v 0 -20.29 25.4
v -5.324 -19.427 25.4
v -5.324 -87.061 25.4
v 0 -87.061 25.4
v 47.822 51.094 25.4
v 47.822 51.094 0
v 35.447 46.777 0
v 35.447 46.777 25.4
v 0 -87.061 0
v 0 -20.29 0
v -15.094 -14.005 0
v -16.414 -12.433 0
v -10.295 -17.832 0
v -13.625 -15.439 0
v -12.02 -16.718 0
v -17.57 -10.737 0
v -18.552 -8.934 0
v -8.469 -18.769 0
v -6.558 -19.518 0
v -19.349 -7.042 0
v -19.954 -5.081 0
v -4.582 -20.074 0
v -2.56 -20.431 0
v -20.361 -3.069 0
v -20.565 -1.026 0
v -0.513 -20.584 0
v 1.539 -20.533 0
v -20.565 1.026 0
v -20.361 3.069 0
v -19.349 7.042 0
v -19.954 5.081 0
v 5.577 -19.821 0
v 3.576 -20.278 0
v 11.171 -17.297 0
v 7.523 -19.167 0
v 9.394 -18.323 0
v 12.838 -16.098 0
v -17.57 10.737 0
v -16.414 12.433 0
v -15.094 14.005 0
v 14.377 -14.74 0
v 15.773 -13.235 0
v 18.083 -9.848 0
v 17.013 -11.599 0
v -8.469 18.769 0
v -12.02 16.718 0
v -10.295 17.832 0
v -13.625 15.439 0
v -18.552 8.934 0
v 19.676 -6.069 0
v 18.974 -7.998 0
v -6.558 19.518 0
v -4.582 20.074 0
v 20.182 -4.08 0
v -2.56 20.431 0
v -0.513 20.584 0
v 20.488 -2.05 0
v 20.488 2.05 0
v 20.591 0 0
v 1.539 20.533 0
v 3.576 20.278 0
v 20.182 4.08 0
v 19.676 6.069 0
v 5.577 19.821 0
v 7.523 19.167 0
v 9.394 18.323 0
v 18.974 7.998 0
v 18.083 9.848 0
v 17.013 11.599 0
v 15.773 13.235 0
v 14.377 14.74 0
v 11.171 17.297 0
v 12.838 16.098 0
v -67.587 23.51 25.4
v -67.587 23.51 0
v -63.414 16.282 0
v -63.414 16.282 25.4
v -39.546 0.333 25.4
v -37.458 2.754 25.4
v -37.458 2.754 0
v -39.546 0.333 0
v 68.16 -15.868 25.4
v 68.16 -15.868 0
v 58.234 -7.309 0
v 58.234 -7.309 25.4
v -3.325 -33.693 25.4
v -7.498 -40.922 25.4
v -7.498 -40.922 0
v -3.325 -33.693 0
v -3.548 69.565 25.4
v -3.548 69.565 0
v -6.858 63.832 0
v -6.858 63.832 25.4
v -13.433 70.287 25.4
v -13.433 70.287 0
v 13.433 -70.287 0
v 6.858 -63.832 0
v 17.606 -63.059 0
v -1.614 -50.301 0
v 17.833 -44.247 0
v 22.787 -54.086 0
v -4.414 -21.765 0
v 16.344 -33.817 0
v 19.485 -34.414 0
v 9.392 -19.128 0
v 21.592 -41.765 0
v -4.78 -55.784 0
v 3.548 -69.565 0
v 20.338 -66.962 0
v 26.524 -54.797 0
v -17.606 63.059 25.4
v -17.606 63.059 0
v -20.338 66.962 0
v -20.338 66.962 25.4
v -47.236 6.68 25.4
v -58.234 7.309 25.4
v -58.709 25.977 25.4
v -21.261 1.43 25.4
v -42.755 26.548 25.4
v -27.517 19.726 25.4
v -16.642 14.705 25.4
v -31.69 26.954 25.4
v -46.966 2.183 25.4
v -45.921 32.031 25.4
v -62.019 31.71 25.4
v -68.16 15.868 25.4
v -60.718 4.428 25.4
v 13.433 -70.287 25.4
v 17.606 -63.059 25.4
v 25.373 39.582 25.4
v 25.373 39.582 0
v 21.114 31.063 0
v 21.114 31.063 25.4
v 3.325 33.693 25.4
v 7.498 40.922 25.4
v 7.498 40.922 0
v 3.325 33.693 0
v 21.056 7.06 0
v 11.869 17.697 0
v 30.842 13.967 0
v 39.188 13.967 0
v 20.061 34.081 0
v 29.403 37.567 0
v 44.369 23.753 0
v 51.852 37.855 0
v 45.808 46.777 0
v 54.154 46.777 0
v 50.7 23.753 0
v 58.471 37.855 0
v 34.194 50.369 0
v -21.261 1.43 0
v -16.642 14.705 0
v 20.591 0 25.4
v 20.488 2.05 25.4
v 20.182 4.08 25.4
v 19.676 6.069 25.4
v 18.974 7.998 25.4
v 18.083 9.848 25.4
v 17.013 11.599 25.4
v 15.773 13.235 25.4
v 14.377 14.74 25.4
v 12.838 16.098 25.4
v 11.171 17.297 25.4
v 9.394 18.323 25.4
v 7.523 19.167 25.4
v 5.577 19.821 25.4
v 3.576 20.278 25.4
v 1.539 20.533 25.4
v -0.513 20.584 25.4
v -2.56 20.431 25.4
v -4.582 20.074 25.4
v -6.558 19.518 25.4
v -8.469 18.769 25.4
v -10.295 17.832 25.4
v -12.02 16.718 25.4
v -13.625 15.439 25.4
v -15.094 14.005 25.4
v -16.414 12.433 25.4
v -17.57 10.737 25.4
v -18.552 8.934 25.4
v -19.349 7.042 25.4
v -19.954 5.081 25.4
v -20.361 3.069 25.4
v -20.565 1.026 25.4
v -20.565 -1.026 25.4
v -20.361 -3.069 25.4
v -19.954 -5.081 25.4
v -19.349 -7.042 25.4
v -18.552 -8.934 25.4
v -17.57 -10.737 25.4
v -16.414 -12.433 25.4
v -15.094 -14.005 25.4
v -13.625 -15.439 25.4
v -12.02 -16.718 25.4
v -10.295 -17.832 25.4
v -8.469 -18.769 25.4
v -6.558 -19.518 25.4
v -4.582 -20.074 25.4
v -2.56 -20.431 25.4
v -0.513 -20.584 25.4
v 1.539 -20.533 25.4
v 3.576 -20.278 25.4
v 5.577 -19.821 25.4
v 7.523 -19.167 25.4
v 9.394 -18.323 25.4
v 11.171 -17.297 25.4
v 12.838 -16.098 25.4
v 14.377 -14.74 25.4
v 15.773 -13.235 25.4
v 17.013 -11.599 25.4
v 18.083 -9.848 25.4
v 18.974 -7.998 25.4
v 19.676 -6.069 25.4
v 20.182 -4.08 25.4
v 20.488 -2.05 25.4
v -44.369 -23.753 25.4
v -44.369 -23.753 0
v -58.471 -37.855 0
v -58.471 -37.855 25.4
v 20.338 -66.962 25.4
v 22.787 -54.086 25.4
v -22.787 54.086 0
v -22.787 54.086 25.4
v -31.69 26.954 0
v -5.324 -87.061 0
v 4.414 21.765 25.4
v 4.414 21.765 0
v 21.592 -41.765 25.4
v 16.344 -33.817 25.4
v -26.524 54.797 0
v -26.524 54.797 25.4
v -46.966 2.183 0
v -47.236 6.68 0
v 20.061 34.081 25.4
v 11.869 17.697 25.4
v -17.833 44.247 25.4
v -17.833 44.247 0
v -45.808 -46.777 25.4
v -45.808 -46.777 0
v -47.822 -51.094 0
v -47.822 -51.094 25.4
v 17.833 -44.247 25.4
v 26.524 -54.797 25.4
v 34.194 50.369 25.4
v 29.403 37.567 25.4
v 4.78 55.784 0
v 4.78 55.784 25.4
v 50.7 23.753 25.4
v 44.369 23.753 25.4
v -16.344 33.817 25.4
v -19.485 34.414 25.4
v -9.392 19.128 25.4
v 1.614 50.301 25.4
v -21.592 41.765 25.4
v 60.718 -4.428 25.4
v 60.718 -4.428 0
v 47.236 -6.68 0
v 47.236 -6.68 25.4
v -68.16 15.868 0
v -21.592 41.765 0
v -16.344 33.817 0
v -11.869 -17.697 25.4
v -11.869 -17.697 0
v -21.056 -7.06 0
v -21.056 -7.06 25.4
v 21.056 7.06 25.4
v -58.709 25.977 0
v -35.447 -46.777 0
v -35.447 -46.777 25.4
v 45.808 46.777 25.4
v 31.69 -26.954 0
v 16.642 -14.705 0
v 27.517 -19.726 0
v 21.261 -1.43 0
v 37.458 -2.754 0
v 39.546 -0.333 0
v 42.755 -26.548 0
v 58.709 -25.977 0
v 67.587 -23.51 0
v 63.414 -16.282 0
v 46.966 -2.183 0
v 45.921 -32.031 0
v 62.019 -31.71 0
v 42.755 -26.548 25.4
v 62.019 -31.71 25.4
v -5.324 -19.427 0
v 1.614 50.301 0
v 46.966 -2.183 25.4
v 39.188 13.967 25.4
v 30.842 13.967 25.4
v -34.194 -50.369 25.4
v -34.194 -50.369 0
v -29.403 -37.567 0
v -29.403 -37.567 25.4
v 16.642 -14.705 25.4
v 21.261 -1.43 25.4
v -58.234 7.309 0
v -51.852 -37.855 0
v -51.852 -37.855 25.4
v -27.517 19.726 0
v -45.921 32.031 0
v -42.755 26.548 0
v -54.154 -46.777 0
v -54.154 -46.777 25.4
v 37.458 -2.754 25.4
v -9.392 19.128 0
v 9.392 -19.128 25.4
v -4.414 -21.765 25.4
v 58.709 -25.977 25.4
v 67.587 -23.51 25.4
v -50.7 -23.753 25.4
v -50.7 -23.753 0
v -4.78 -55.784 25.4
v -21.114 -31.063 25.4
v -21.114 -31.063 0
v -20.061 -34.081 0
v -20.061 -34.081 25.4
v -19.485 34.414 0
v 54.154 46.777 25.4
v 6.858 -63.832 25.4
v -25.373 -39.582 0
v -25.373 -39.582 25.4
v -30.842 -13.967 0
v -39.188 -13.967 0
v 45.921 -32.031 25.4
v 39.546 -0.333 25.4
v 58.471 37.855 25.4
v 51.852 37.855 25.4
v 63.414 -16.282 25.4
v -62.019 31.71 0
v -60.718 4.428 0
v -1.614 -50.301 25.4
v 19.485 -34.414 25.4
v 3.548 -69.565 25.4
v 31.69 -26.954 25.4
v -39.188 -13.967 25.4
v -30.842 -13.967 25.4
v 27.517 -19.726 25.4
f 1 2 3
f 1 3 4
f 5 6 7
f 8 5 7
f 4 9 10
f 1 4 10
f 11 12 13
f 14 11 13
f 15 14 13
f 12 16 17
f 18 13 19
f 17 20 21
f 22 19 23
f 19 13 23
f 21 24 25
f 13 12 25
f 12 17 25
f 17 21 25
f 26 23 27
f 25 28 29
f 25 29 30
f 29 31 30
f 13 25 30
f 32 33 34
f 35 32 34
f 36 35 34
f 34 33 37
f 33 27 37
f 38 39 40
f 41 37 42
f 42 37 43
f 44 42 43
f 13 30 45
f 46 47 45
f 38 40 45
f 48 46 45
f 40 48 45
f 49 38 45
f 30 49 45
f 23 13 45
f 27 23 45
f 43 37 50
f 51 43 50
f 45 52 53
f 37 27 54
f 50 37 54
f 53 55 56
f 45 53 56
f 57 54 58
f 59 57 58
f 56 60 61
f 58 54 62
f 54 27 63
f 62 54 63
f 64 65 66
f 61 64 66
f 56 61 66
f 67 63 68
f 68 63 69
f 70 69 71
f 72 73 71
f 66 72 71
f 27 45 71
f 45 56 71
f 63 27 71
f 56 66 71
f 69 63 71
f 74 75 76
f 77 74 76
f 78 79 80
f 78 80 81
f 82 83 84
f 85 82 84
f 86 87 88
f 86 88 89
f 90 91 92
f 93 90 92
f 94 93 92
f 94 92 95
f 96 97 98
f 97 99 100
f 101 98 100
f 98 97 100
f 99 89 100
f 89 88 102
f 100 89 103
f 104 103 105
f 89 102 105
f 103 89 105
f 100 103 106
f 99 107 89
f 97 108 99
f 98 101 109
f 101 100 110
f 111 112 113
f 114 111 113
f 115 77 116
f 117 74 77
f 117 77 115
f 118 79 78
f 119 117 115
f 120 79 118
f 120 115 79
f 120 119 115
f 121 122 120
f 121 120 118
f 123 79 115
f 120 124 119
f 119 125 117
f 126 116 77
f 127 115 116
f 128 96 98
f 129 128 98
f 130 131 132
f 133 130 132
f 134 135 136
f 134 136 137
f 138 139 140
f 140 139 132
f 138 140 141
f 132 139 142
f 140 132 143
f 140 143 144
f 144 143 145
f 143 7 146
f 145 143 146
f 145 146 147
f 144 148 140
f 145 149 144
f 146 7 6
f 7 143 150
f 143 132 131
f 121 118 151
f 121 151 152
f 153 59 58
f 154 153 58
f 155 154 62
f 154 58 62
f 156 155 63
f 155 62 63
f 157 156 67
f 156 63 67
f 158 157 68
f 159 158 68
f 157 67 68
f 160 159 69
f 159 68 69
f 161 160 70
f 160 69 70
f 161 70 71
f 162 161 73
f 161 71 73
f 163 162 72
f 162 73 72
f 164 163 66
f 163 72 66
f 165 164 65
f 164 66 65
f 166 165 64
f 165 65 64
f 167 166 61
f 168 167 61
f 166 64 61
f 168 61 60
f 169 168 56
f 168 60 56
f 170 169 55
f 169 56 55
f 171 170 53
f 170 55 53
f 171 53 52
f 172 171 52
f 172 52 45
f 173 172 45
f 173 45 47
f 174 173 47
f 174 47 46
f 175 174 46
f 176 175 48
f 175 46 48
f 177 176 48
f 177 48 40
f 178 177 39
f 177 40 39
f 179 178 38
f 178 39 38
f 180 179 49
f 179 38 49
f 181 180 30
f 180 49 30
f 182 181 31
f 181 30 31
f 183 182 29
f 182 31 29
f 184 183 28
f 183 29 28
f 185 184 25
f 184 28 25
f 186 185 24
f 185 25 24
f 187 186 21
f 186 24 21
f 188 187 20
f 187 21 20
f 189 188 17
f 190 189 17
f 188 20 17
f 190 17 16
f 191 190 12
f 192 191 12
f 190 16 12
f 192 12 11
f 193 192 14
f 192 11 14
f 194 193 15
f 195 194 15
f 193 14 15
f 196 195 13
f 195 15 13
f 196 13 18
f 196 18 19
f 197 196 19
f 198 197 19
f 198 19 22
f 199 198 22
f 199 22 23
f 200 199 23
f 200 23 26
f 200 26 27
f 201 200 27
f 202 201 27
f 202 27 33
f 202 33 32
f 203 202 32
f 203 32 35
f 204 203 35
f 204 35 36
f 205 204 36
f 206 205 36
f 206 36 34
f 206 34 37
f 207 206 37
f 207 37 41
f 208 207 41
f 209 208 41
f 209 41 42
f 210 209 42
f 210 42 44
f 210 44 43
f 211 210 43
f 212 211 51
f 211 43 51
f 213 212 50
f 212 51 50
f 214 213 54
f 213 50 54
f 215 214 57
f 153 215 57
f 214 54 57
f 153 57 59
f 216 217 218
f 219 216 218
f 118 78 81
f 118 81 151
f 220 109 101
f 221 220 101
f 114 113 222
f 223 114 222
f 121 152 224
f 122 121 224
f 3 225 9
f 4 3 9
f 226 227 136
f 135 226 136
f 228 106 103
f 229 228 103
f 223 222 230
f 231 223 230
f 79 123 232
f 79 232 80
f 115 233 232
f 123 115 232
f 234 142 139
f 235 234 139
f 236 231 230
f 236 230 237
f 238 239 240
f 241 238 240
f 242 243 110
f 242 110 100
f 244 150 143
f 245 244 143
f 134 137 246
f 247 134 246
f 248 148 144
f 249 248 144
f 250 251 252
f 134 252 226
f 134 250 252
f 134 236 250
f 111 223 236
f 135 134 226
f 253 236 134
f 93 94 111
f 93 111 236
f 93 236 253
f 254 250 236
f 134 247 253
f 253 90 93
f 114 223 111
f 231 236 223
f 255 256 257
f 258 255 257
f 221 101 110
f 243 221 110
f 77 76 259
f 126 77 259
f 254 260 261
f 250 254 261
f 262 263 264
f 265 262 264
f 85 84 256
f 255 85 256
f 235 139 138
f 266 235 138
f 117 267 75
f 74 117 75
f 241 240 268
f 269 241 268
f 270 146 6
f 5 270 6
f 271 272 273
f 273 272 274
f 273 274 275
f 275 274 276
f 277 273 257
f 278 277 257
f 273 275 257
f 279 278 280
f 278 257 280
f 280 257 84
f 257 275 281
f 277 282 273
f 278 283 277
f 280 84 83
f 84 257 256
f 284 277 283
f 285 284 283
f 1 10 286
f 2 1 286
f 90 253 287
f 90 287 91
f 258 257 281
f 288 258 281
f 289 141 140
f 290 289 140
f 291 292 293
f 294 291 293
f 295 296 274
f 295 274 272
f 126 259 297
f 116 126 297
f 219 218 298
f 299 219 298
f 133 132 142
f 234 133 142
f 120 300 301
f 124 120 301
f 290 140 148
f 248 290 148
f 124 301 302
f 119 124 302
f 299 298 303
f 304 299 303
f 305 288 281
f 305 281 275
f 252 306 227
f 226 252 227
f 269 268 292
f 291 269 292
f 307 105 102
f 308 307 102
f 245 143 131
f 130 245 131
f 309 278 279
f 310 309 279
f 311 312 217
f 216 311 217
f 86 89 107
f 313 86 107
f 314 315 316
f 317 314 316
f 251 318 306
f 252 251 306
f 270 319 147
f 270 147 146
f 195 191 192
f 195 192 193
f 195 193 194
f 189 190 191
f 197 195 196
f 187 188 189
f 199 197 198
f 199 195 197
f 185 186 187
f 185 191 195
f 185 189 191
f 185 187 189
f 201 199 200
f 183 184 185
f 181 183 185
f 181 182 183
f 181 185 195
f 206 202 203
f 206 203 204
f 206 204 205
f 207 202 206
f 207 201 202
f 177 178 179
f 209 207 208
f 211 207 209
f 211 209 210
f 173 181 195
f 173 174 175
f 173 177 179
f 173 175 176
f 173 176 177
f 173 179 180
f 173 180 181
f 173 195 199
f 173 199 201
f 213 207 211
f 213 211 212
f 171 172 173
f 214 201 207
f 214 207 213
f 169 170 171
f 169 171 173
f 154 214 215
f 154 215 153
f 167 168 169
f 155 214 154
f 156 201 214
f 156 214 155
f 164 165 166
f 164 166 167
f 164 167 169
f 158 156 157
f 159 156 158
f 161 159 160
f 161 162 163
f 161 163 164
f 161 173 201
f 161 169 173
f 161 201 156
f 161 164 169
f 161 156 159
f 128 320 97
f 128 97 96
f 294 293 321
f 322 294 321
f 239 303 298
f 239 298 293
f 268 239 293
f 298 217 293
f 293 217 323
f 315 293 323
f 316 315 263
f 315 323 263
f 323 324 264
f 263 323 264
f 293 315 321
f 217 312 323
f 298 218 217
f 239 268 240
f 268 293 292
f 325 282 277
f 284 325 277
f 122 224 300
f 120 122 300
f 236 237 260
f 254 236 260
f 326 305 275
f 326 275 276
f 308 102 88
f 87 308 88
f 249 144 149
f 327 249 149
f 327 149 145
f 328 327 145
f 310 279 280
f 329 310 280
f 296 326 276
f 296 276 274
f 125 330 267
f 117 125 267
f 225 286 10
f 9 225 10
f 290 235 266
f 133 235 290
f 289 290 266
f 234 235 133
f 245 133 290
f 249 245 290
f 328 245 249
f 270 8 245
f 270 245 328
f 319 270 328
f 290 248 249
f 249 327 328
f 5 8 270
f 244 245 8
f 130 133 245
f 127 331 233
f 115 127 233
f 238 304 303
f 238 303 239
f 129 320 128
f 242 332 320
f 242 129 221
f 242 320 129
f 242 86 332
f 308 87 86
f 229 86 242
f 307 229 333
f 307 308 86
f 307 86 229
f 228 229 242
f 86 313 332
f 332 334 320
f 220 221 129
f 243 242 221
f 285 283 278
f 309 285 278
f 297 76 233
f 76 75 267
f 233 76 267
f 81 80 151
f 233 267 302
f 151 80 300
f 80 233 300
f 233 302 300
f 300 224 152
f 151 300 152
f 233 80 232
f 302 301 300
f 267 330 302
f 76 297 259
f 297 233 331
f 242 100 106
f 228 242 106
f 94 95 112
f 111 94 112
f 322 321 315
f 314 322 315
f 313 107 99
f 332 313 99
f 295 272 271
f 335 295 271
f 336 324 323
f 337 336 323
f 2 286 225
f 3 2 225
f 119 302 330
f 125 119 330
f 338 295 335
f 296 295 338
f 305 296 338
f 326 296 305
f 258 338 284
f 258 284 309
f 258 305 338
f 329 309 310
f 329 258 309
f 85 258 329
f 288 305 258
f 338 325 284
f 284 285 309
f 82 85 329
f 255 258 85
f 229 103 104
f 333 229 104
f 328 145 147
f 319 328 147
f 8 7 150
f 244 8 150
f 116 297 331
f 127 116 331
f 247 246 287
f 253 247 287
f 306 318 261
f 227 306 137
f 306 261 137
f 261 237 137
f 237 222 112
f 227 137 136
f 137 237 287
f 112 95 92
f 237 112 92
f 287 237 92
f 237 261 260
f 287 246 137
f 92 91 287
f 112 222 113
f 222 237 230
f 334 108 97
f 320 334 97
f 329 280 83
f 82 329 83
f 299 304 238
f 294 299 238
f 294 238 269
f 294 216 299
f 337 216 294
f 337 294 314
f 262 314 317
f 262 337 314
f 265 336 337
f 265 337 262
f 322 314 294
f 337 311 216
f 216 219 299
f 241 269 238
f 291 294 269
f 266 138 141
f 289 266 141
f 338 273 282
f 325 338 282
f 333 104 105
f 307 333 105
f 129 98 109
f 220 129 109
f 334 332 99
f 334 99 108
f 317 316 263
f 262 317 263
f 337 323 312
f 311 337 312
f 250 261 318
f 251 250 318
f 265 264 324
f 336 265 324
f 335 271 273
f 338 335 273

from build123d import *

# Parameters (mm, degrees)
F2_DEPTH = 25.4
F0_R     = 20.5906873936
F4_DEPTH = 25.4


with BuildPart() as f2:
    # F1 (on Top) → F2 (new body)
    with BuildSketch(Plane.XY):
        Polygon((-17.83298781, 44.2471951997), (-21.5923608654, 41.765058951), (-16.3444144081, 33.8166683183), (-19.4846056894, 34.4139499588), (-9.3918710847, 19.1277808177), (4.4140186546, 21.765322685), (7.4979696061, 40.9215589741), (3.3247867238, 33.6933941926), (4.7796854469, 55.7841447948), (1.6138219926, 50.3007084421), (-3.5480446712, 69.5650520044), (-6.8578086392, 63.8323726508), (-13.4332479786, 70.2873393486), (-17.6064317922, 63.059172954), (-20.3378177437, 66.9624460909), (-22.7869359653, 54.0862765175), (-26.5243781157, 54.7971585558), align=None)
    extrude(amount=F2_DEPTH)


with BuildPart() as f2b:
    # F1 (on Top) → F2, piece 2 (new body)
    with BuildSketch(Plane.XY):
        Polygon((-47.2356889941, 6.679777131), (-46.9657824748, 2.1829964384), (-37.4583010391, 2.7536560717), (-39.5456577536, 0.3328114697), (-21.2610796485, 1.4302914604), (-16.6423130395, 14.7053136302), (-31.690124831, 26.9542116428), (-27.5169419486, 19.7260468612), (-45.9206437972, 32.0314014165), (-42.7547803429, 26.5479650638), (-62.019124587, 31.7098291831), (-58.709360619, 25.9771498295), (-67.5872454296, 23.5101356696), (-63.4140616159, 16.2819692749), (-68.1600882861, 15.8681562218), (-58.2335574429, 7.3090728384), (-60.7179204224, 4.4277940102), align=None)
    extrude(amount=F2_DEPTH)


with BuildPart() as f2c:
    # F1 (on Top) → F2, piece 3 (new body)
    with BuildSketch(Plane.XY):
        Polygon((11.8692085638, 17.6974893572), (21.0563316941, 7.0600090548), (39.1880944371, 13.9673473313), (30.8417286724, 13.9673473313), (50.7003292441, 23.7527433783), (44.3686023355, 23.7527433783), (58.4710799158, 37.8552228212), (51.8515519798, 37.8552228212), (54.1539974511, 46.7772036791), (45.8076298237, 46.7772036791), (47.8222705424, 51.0942898691), (35.4466214776, 46.7772036791), (34.1935423067, 50.3693645457), (29.4027011842, 37.5674180686), (25.3734216094, 39.5820625126), (21.113886631, 31.0630122466), (20.0610520642, 34.0811384892), align=None)
    extrude(amount=F2_DEPTH)


with BuildPart() as f2d:
    # F1 (on Top) → F2, piece 4 (new body)
    with BuildSketch(Plane.XY):
        Polygon((47.2356889941, -6.679777131), (46.9657824748, -2.1829964384), (37.4583010391, -2.7536560717), (39.5456577536, -0.3328114697), (21.2610796485, -1.4302914604), (16.6423130395, -14.7053136302), (31.690124831, -26.9542116428), (27.5169419486, -19.7260468612), (45.9206437972, -32.0314014165), (42.7547803429, -26.5479650638), (62.019124587, -31.7098291831), (58.709360619, -25.9771498295), (67.5872454296, -23.5101356696), (63.4140616159, -16.2819692749), (68.1600882861, -15.8681562218), (58.2335574429, -7.3090728384), (60.7179204224, -4.4277940102), align=None)
    extrude(amount=F2_DEPTH)


with BuildPart() as f2e:
    # F1 (on Top) → F2, piece 5 (new body)
    with BuildSketch(Plane.XY):
        Polygon((17.83298781, -44.2471951997), (21.5923608654, -41.765058951), (16.3444144081, -33.8166683183), (19.4846056894, -34.4139499588), (9.3918710847, -19.1277808177), (-4.4140186546, -21.765322685), (-7.4979696061, -40.9215589741), (-3.3247867238, -33.6933941926), (-4.7796854469, -55.7841447948), (-1.6138219926, -50.3007084421), (3.5480446712, -69.5650520044), (6.8578086392, -63.8323726508), (13.4332479786, -70.2873393486), (17.6064317922, -63.059172954), (20.3378177437, -66.9624460909), (22.7869359653, -54.0862765175), (26.5243781157, -54.7971585558), align=None)
    extrude(amount=F2_DEPTH)


with BuildPart() as f2f:
    # F1 (on Top) → F2, piece 6 (new body)
    with BuildSketch(Plane.XY):
        Polygon((-29.4027011842, -37.5674180686), (-25.3734216094, -39.5820625126), (-21.113886631, -31.0630122466), (-20.0610520642, -34.0811384892), (-11.8692085638, -17.6974893572), (-21.0563316941, -7.0600090548), (-39.1880944371, -13.9673473313), (-30.8417286724, -13.9673473313), (-50.7003292441, -23.7527433783), (-44.3686023355, -23.7527433783), (-58.4710799158, -37.8552228212), (-51.8515519798, -37.8552228212), (-54.1539974511, -46.7772036791), (-45.8076298237, -46.7772036791), (-47.8222705424, -51.0942898691), (-35.4466214776, -46.7772036791), (-34.1935423067, -50.3693645457), align=None)
    extrude(amount=F2_DEPTH)


with BuildPart() as f2g:
    # F0 (on Top) → F2, piece 7 (new body)
    with BuildSketch(Plane.XY):
        Circle(F0_R)
    extrude(amount=F2_DEPTH)


with BuildPart() as f4:
    # F3 (on Top) → F4 (new body)
    with BuildSketch(Plane.XY):
        Polygon((0, -20.2903039753), (-5.3244065493, -19.4268878549), (-5.3244065493, -87.0612487197), (0, -87.0612487197), align=None)
    extrude(amount=F4_DEPTH)


solid = Compound([f2.part, f2b.part, f2c.part, f2d.part, f2e.part, f2f.part, f2g.part, f4.part])
